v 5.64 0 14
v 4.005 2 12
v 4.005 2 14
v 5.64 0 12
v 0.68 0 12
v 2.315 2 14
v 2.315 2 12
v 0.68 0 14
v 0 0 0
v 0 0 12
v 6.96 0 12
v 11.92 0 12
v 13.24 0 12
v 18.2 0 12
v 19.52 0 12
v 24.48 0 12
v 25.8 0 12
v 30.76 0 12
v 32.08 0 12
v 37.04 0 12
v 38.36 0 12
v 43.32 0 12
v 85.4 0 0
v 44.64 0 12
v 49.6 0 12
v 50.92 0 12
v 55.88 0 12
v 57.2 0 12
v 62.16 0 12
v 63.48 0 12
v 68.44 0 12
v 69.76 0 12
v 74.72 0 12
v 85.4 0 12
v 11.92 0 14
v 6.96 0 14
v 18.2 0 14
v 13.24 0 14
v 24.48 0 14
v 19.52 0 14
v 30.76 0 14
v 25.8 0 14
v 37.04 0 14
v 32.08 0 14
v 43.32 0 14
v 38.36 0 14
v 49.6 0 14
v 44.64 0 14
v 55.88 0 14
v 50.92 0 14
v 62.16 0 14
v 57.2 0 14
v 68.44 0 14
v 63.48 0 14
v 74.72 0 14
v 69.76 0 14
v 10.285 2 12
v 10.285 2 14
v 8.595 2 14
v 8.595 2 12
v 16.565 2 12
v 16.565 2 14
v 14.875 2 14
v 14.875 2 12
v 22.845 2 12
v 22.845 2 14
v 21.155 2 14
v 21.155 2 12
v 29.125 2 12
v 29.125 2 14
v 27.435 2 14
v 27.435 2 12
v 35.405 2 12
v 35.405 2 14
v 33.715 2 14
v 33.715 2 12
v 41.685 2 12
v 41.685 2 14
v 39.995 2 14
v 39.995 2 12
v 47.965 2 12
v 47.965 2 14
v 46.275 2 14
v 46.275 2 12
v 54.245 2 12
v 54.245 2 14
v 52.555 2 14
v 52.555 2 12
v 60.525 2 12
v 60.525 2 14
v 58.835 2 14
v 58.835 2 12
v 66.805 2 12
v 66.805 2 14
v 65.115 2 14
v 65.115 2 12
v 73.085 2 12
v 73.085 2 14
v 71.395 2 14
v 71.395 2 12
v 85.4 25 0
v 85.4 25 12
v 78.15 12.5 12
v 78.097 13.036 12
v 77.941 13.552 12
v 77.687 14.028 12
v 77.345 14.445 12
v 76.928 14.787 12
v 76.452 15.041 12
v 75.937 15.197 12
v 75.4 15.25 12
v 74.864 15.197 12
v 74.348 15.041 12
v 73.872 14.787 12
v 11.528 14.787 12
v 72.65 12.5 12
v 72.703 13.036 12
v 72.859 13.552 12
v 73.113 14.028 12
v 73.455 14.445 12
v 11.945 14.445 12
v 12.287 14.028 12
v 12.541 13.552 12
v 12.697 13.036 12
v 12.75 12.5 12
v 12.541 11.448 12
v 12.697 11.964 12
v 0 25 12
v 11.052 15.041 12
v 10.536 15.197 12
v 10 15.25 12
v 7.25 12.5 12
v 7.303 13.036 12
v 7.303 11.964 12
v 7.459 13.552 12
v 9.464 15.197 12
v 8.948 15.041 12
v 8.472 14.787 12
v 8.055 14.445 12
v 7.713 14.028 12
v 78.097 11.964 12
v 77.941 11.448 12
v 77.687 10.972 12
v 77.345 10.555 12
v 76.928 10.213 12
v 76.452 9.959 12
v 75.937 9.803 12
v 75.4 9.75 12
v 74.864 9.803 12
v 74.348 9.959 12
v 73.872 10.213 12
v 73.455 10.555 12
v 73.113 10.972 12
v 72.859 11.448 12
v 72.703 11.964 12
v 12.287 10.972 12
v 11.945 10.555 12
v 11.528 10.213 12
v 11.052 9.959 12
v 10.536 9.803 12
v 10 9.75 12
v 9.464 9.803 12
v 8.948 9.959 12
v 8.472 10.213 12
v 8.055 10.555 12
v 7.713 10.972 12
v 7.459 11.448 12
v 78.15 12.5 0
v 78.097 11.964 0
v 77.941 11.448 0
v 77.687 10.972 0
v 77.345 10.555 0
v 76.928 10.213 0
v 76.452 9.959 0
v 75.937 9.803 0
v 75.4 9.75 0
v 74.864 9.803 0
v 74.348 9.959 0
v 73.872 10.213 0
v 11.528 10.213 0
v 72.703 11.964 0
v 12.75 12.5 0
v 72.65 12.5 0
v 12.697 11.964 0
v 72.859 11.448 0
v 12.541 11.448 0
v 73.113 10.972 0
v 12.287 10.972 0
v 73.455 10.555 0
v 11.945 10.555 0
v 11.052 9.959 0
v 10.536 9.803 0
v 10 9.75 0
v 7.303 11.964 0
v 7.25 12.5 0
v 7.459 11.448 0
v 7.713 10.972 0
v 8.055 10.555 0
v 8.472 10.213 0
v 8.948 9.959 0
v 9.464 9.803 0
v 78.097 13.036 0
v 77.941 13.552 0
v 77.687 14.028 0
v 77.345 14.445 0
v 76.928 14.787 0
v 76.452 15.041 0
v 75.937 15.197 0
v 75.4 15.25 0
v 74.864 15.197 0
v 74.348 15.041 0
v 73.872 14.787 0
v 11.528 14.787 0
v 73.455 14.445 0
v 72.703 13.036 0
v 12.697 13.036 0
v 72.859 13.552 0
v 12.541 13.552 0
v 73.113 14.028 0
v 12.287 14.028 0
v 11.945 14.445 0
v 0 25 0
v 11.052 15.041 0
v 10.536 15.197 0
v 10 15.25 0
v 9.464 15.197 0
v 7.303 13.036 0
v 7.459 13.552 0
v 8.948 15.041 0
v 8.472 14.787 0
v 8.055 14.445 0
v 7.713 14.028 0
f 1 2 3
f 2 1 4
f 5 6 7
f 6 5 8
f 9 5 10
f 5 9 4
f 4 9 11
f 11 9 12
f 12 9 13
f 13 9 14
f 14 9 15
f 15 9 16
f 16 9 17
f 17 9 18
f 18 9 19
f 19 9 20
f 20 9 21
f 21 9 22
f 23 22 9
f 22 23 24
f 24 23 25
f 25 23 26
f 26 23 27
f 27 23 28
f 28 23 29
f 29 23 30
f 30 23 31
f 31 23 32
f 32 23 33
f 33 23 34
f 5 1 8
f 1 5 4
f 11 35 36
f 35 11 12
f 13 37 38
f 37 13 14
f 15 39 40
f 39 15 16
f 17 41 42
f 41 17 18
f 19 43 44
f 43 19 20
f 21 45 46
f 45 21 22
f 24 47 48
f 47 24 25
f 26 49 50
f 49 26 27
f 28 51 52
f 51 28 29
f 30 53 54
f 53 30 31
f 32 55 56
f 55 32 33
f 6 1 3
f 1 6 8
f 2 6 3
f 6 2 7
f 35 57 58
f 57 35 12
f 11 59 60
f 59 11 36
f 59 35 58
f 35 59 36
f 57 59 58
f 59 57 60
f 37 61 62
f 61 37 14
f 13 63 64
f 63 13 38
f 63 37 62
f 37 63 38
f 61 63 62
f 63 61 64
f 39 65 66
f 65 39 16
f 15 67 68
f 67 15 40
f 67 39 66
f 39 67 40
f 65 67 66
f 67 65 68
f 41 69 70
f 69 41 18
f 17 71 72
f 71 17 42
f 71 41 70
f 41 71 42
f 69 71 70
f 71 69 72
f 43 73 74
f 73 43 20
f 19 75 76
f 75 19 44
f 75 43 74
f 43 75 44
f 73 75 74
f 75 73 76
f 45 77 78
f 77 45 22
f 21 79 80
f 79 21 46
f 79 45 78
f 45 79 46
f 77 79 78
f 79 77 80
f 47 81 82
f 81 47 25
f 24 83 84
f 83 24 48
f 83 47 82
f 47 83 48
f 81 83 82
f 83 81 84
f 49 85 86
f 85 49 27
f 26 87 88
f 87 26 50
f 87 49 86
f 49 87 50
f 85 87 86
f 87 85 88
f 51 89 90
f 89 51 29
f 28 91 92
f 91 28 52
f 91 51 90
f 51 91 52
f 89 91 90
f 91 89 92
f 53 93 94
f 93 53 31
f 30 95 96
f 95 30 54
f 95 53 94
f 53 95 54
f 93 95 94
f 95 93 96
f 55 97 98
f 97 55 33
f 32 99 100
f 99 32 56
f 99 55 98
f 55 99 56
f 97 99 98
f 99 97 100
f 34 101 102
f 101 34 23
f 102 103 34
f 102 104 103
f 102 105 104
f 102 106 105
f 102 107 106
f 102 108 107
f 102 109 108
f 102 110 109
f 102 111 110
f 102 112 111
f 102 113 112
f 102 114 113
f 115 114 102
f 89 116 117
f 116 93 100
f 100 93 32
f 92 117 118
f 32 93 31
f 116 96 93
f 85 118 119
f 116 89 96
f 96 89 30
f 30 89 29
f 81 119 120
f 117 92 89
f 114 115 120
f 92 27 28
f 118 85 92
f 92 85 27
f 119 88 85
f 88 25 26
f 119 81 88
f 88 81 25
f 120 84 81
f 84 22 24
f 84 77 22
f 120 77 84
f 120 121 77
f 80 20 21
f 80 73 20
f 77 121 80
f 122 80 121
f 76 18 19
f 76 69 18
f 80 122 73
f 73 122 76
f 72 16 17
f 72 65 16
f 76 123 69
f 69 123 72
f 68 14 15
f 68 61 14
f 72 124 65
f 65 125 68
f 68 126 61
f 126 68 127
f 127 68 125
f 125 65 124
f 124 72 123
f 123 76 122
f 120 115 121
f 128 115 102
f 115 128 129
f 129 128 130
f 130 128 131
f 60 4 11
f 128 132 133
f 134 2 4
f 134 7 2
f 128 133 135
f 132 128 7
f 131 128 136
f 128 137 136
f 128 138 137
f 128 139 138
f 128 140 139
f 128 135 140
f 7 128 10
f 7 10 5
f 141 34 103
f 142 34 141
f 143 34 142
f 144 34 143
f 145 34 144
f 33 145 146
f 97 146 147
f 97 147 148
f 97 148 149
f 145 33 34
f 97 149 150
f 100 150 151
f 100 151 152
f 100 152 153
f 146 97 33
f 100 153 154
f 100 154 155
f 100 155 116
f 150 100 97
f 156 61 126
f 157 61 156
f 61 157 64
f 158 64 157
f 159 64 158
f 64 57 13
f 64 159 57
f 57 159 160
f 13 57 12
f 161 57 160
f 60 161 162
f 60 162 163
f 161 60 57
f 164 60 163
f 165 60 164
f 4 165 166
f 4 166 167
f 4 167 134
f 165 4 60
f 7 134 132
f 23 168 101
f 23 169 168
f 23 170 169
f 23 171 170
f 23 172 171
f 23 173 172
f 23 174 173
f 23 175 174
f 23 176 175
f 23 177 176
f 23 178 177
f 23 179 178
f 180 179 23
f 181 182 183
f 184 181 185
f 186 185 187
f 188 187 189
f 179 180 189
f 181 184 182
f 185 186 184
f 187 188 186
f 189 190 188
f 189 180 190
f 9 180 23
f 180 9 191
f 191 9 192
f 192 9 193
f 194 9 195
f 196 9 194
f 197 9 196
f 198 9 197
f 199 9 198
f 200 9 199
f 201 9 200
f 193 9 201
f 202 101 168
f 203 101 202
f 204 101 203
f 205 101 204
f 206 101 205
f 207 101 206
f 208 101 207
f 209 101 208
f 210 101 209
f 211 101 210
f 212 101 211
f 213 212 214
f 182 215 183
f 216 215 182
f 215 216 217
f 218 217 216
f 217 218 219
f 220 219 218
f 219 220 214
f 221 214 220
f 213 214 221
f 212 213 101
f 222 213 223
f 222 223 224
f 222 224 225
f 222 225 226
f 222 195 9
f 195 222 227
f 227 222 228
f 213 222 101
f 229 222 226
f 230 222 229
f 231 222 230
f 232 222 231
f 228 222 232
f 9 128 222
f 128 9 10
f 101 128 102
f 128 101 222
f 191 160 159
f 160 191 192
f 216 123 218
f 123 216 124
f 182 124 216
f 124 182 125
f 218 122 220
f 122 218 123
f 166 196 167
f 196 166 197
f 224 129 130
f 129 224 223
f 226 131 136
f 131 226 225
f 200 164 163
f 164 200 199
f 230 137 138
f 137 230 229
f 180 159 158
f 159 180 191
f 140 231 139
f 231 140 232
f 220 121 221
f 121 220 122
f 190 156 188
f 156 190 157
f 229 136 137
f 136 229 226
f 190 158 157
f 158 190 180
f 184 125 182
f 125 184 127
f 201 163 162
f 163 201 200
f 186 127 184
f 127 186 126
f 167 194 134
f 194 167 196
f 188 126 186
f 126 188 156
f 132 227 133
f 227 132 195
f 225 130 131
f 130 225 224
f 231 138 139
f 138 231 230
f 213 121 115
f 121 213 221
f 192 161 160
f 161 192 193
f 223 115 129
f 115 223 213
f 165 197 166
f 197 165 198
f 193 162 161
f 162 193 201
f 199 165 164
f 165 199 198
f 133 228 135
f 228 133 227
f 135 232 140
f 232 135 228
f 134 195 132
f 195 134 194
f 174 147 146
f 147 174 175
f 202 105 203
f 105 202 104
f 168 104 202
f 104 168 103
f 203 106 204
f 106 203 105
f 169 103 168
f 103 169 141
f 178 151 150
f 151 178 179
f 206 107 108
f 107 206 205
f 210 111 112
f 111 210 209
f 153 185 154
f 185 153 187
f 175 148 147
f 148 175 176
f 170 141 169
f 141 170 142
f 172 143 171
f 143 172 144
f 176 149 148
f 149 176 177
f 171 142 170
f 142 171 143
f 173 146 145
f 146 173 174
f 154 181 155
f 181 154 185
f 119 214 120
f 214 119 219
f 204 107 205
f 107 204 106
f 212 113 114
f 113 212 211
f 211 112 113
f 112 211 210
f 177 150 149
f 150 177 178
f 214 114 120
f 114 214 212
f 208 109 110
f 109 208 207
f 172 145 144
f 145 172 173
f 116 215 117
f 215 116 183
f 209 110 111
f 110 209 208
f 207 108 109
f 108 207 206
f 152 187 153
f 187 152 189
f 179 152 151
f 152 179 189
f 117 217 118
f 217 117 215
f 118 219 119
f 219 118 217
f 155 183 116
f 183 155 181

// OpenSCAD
$fn = 32;

// ----------------------------------------------------------------------
// Gear rack: m=2 z=12, 85.4 x 25 x 14 mm
// ----------------------------------------------------------------------

// --- parameters (mm) ---
length = 85.4;            // rack length, X
width = 25;               // rack width, Y
height = 14;              // overall height, Z
module_m = 2;             // module
back_t = 12;              // tooth root line height
pitch = 6.28;             // circular pitch
tip_w = 1.69;             // tooth thickness at the tip
root_w = 4.96;            // tooth thickness at the root line
hole_d = 5.5;             // mounting hole
sink = 0.6;               // tooth root overlap into the body

tooth_span = 75.4;

module tooth(x0) {
  /* 20 deg flank profile, sunk into the body for a positive overlap */
  translate([x0, 0, back_t - sink])
    linear_extrude(height = height - back_t + sink)
      polygon(points = [[-root_w / 2, 0], [root_w / 2, 0],
                        [tip_w / 2, height - back_t],
                        [-tip_w / 2, height - back_t]]);
}

difference() {
  union() {
    cube([length, width, back_t]);
    for (i = [0 : 12 - 1])
      tooth((i + 0.5) * pitch + (tooth_span - 12 * pitch) / 2);
  }
  translate([10, 12.5, -1]) cylinder(h = back_t + 2, d = hole_d);
  translate([75.4, 12.5, -1]) cylinder(h = back_t + 2, d = hole_d);
}
